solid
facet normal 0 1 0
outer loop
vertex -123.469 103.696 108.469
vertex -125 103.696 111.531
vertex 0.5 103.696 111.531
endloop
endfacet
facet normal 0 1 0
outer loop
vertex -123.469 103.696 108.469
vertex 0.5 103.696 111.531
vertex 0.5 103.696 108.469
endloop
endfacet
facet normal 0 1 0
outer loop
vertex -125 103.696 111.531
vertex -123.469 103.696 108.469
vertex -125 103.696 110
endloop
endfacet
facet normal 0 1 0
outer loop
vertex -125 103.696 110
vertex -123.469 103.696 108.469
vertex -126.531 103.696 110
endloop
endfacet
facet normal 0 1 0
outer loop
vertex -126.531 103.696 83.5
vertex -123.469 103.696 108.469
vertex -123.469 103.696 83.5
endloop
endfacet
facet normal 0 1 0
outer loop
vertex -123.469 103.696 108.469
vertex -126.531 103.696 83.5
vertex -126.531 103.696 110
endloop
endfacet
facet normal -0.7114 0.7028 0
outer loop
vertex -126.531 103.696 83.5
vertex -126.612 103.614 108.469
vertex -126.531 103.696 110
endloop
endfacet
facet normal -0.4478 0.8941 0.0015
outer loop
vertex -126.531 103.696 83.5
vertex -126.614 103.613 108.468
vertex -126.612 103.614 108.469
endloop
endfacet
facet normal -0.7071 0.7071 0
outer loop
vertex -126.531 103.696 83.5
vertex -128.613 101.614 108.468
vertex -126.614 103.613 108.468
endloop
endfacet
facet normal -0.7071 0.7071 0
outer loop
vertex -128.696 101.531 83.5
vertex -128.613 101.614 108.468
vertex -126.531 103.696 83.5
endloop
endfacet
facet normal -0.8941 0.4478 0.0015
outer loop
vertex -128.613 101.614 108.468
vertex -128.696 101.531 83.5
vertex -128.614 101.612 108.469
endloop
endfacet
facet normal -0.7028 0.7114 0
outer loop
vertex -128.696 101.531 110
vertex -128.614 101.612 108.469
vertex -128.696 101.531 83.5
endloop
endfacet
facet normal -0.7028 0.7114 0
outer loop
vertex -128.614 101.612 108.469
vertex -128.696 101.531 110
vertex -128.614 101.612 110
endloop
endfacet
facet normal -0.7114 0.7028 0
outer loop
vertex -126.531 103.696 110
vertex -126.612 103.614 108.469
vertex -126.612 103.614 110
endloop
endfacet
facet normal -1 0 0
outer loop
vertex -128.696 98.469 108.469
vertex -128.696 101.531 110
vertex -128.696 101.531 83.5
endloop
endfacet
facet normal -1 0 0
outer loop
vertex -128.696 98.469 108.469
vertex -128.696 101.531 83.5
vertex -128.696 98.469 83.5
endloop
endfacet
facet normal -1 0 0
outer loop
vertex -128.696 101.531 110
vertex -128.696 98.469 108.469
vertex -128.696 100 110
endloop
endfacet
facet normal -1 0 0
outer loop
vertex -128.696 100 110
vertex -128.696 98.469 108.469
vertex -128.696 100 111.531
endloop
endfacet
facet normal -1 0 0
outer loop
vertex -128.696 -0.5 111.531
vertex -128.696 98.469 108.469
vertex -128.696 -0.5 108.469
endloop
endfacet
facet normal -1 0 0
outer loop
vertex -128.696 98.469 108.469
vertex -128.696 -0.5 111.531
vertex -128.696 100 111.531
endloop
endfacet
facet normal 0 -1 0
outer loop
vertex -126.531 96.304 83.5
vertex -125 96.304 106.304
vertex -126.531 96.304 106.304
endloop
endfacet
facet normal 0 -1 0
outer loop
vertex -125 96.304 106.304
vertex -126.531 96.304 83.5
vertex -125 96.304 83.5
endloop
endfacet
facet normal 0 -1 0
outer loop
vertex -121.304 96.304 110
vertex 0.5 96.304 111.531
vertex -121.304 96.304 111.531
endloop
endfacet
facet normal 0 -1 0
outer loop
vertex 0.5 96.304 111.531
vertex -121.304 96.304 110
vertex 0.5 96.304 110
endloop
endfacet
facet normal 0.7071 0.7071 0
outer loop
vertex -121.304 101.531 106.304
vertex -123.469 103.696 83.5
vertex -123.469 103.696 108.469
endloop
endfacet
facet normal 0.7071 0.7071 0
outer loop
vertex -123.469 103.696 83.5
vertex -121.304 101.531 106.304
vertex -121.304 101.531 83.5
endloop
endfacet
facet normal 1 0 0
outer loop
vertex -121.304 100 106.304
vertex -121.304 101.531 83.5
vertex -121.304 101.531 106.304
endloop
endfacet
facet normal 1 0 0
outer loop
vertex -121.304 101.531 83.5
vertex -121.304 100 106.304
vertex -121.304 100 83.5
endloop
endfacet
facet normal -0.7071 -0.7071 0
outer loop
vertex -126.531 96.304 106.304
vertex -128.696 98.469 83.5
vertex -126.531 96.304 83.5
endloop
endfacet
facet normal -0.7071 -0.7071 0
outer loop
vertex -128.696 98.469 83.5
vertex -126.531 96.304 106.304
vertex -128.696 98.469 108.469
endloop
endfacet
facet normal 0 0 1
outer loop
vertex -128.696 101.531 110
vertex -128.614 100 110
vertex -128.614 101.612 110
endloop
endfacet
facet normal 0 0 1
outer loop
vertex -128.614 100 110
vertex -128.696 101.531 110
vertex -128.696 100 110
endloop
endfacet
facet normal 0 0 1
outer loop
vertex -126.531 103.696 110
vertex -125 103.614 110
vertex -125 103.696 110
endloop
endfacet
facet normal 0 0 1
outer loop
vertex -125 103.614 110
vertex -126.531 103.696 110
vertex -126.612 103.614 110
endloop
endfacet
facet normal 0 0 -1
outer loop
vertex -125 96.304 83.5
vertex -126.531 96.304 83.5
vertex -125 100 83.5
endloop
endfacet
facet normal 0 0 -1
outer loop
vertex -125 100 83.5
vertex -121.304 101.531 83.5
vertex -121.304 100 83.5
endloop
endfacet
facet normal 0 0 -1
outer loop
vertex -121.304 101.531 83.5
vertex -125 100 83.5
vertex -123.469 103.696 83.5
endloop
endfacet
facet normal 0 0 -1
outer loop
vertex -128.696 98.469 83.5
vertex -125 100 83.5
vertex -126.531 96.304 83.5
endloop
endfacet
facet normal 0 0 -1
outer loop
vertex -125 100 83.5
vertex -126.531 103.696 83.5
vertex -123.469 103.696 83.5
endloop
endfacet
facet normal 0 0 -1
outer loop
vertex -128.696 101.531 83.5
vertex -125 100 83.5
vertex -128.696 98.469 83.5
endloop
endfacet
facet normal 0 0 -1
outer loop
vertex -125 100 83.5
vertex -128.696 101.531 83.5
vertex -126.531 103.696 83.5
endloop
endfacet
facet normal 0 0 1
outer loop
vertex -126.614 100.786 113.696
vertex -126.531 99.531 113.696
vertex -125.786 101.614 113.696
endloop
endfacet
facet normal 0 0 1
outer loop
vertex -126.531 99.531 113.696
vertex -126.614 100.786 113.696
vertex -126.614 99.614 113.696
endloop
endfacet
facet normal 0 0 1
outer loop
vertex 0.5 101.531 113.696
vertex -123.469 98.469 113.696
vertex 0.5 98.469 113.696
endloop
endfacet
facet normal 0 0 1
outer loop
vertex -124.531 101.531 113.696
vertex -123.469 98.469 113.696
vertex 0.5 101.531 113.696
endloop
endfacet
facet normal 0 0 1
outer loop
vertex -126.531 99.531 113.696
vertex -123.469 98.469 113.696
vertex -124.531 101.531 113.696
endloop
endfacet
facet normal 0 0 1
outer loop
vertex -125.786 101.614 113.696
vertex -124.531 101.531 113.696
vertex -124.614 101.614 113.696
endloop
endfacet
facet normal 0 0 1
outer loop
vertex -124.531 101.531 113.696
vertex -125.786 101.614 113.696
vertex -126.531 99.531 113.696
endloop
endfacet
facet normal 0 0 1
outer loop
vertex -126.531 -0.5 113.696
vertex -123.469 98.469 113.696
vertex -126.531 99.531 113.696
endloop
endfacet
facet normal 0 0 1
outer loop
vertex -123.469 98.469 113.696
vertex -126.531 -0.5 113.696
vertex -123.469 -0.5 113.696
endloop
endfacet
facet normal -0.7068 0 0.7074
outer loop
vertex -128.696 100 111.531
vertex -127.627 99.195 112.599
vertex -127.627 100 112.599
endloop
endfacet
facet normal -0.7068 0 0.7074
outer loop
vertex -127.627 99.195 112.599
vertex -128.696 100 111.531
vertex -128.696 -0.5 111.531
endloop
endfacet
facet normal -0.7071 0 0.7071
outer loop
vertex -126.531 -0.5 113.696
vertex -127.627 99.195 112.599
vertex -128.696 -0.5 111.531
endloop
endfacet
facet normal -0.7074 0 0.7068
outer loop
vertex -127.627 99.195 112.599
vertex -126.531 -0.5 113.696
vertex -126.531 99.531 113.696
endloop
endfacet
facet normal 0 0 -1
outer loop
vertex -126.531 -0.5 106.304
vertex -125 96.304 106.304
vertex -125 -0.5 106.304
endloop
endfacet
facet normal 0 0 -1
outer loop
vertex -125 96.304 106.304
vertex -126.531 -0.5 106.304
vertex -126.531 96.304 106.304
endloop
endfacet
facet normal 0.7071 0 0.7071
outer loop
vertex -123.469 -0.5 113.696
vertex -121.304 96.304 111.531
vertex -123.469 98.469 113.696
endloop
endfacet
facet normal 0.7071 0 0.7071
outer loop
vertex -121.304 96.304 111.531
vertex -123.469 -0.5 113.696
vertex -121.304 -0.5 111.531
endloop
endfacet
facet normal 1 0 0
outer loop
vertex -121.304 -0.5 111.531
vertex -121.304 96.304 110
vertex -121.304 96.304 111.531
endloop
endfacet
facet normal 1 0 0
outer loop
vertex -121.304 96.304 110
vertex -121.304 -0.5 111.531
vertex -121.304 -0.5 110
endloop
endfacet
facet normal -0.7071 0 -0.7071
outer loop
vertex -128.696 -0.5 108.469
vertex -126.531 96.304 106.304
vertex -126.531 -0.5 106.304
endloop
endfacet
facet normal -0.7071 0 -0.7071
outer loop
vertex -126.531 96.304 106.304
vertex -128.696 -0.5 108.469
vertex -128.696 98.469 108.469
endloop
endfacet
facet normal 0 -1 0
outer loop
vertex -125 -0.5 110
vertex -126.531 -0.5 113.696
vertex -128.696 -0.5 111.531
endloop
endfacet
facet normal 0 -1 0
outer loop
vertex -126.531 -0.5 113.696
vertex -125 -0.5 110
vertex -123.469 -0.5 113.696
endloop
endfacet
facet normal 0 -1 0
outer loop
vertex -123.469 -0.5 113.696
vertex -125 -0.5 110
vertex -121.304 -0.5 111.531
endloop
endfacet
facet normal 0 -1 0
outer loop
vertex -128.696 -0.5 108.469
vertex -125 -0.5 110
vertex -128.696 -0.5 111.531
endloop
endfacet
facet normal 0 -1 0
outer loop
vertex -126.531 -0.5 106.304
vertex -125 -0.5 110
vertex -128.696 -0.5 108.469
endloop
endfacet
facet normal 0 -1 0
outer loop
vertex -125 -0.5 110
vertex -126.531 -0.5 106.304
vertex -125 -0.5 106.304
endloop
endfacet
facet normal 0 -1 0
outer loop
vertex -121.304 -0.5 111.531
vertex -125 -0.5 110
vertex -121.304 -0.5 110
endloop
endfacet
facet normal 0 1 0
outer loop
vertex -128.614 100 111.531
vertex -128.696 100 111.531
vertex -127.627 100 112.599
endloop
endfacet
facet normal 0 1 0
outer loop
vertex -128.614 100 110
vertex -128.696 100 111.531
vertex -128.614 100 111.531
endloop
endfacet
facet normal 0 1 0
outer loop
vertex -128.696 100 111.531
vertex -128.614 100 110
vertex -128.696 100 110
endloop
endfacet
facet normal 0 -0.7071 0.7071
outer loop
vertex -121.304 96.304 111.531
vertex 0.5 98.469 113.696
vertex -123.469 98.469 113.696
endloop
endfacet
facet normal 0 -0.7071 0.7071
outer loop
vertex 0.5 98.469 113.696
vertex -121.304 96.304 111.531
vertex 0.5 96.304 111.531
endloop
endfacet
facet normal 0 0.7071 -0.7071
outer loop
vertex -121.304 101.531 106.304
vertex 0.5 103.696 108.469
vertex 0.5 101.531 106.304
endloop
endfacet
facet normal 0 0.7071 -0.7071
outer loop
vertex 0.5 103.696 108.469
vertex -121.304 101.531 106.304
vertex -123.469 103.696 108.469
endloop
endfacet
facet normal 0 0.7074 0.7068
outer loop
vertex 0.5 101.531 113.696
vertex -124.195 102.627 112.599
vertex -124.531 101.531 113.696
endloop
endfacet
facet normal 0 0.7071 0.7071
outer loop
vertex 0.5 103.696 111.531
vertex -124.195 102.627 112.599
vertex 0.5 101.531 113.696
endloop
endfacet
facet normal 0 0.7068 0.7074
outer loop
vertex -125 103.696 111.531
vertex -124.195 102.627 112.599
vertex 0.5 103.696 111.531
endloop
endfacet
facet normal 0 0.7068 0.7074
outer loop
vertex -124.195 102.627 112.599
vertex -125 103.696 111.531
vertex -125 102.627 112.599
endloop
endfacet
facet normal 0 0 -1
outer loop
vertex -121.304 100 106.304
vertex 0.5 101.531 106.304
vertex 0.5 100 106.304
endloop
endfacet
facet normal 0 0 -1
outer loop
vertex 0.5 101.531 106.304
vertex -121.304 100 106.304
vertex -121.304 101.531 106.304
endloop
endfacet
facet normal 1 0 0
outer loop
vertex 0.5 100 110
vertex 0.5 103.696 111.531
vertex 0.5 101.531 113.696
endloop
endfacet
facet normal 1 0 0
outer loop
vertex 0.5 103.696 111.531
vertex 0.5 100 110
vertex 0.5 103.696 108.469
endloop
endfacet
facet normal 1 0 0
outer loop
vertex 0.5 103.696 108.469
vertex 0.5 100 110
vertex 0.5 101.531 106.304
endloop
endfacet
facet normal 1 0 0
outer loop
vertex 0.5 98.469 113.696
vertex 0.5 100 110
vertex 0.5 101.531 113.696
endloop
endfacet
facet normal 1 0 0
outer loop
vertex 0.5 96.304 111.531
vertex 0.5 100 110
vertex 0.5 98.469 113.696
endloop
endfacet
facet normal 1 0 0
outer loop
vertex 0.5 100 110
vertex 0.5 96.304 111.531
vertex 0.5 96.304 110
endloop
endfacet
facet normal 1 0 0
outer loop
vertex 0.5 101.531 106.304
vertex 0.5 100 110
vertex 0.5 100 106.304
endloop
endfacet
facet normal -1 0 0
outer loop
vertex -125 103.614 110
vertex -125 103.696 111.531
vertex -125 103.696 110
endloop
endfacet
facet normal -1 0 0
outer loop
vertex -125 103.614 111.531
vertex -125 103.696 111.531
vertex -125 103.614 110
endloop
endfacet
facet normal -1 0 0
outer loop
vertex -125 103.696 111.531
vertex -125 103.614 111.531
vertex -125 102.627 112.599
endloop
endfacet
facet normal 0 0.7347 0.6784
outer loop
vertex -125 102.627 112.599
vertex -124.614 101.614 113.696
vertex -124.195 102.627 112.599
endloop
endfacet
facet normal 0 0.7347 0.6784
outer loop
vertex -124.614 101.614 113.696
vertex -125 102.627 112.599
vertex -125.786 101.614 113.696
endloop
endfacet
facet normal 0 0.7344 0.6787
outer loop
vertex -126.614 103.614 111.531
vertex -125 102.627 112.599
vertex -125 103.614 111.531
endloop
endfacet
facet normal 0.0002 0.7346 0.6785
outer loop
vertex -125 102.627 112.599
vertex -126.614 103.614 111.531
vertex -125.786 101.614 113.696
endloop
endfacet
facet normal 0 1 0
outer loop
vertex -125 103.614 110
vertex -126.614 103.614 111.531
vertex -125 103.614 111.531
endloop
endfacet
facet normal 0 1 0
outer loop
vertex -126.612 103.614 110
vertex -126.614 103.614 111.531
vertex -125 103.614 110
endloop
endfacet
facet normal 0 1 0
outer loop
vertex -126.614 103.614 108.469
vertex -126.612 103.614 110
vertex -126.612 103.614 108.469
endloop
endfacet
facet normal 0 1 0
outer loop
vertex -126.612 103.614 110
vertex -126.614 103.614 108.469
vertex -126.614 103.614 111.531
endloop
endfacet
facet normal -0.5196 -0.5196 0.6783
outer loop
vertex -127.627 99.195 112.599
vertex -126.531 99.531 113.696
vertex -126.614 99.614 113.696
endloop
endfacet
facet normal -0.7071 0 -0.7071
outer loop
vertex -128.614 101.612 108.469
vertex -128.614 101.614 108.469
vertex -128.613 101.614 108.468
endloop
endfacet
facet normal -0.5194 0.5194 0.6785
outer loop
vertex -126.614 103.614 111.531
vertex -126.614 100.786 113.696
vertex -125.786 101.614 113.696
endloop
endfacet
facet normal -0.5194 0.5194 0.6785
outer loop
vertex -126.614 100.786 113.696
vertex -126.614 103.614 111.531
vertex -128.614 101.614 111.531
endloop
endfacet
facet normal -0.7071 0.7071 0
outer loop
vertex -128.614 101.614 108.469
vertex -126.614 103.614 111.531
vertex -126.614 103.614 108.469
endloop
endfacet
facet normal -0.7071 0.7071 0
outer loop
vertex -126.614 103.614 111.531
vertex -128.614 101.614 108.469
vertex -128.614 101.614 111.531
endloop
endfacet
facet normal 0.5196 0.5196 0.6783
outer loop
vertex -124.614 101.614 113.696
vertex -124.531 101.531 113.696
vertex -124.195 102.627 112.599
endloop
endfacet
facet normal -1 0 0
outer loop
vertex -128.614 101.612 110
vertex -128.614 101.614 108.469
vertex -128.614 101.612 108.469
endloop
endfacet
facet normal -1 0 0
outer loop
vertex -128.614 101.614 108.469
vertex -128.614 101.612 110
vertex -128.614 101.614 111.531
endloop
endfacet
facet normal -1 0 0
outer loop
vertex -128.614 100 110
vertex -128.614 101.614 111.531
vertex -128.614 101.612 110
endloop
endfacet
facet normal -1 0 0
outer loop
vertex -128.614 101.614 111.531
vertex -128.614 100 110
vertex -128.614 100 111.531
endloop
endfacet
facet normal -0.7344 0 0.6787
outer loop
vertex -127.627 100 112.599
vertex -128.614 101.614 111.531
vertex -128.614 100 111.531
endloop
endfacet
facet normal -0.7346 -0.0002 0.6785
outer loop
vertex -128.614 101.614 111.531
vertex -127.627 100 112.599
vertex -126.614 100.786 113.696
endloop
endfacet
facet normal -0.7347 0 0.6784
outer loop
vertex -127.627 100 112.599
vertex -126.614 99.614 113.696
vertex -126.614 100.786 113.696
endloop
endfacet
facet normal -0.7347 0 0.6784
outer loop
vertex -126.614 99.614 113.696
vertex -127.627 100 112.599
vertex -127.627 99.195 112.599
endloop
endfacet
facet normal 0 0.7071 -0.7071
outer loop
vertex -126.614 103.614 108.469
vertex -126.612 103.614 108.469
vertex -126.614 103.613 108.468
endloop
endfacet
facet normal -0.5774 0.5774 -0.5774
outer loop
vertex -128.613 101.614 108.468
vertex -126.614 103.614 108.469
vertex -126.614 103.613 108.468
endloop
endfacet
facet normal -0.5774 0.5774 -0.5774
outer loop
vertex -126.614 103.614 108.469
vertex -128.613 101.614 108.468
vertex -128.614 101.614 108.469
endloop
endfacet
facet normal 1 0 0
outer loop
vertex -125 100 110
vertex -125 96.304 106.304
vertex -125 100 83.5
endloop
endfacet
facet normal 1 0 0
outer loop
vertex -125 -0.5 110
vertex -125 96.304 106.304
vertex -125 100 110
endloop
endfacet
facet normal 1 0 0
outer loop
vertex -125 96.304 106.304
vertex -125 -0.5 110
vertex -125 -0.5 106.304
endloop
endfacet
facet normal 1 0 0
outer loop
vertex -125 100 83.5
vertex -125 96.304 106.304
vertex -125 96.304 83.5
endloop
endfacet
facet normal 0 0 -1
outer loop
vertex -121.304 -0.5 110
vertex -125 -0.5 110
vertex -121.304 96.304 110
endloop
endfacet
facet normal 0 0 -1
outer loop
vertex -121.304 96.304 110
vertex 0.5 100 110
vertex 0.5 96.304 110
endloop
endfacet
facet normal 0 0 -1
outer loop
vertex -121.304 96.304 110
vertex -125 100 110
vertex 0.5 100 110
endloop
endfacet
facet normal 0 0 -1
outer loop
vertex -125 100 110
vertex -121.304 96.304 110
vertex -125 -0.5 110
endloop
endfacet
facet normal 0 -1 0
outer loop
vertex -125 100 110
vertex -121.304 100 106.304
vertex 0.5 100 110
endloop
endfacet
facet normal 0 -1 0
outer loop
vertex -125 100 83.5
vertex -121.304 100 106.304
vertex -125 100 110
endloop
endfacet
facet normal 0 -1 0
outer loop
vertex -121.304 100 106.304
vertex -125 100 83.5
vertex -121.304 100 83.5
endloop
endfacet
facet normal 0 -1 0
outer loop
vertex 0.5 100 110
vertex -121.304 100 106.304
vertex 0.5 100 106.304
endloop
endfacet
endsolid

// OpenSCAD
// file: ../Parts/rounder.scad
// rounder.scad
// cutting tool for rounding off corners with a cylinder

//---------------------
module rounder(
r=10,   // radius
h=10,   // height
f=22,    // $fn
extra=0.01  // extra size for the cube
){

difference(){
  translate([-extra,-extra,-extra])
  cube([r+extra,r+extra,h+2*extra]);
  translate([r,r,-1])
  cylinder(r=r,h=h+2,$fn=f);
}

}

//---------------------------------------------------------------------------
module bevel(x=1,y=1,h=10){

linear_extrude(height=h)
polygon(points=[[0,0],[x,0],[0,y]]);
    
}
  

//========================

rounder();

//========================
// main file
//=================================================================================
// boxCorners.scad
//
// For Fairy Crystal storage box.
//
// Dr Tom Flint, 1 Jan 2023
//=================================================================================

use <../Parts/rounder.scad>
use <../Parts/threads.scad>
use <../Gears/gears.scad>

r1=4;   // radius of knob
$fn=8;

//-----------------------------------------------------------------------------------
module top1(){

extra=0.5;

difference(){
  union(){
    translate([125,100, 84-extra])
    rotate([0,0,180/8])
    cylinder(r=r1,h=26+extra);

    translate([125,100, 84+26])
    rotate([90,0,0])
    rotate([0,0,180/8])
    cylinder(r=r1,h=100+extra);

    translate([125,100, 84+26])
    rotate([0,-90,0])
    rotate([0,0,180/8])
    cylinder(r=r1,h=125+extra);

    translate([125.2,100.2, 84+26])
    rotate([0,0,180/8])
    sphere(r=r1);
  }
  boxTop(a=0);
  boxBase();
}
}

//-----------------------------------------------------------------------------------
module boxTop(a=0){

translate([-250/2,-200/2,84])
translate([0,-2,0])
rotate([a,0,0])
translate([0,2,0])
cube([250,200,26]);



}

//-----------------------------------------------------------------------------------
module boxBase(){

translate([0,0,84/2])
cube([250,200,84],center=true);




}

//================================================================================

//color("cyan")
//boxTop(a=0);

//boxBase();

//top1();

mirror([1,0,0])
top1();

if(0){
  rotate([0,0,180]){
    top1();
    mirror([1,0,0])
    top1();
  }
}

//================================================================================
